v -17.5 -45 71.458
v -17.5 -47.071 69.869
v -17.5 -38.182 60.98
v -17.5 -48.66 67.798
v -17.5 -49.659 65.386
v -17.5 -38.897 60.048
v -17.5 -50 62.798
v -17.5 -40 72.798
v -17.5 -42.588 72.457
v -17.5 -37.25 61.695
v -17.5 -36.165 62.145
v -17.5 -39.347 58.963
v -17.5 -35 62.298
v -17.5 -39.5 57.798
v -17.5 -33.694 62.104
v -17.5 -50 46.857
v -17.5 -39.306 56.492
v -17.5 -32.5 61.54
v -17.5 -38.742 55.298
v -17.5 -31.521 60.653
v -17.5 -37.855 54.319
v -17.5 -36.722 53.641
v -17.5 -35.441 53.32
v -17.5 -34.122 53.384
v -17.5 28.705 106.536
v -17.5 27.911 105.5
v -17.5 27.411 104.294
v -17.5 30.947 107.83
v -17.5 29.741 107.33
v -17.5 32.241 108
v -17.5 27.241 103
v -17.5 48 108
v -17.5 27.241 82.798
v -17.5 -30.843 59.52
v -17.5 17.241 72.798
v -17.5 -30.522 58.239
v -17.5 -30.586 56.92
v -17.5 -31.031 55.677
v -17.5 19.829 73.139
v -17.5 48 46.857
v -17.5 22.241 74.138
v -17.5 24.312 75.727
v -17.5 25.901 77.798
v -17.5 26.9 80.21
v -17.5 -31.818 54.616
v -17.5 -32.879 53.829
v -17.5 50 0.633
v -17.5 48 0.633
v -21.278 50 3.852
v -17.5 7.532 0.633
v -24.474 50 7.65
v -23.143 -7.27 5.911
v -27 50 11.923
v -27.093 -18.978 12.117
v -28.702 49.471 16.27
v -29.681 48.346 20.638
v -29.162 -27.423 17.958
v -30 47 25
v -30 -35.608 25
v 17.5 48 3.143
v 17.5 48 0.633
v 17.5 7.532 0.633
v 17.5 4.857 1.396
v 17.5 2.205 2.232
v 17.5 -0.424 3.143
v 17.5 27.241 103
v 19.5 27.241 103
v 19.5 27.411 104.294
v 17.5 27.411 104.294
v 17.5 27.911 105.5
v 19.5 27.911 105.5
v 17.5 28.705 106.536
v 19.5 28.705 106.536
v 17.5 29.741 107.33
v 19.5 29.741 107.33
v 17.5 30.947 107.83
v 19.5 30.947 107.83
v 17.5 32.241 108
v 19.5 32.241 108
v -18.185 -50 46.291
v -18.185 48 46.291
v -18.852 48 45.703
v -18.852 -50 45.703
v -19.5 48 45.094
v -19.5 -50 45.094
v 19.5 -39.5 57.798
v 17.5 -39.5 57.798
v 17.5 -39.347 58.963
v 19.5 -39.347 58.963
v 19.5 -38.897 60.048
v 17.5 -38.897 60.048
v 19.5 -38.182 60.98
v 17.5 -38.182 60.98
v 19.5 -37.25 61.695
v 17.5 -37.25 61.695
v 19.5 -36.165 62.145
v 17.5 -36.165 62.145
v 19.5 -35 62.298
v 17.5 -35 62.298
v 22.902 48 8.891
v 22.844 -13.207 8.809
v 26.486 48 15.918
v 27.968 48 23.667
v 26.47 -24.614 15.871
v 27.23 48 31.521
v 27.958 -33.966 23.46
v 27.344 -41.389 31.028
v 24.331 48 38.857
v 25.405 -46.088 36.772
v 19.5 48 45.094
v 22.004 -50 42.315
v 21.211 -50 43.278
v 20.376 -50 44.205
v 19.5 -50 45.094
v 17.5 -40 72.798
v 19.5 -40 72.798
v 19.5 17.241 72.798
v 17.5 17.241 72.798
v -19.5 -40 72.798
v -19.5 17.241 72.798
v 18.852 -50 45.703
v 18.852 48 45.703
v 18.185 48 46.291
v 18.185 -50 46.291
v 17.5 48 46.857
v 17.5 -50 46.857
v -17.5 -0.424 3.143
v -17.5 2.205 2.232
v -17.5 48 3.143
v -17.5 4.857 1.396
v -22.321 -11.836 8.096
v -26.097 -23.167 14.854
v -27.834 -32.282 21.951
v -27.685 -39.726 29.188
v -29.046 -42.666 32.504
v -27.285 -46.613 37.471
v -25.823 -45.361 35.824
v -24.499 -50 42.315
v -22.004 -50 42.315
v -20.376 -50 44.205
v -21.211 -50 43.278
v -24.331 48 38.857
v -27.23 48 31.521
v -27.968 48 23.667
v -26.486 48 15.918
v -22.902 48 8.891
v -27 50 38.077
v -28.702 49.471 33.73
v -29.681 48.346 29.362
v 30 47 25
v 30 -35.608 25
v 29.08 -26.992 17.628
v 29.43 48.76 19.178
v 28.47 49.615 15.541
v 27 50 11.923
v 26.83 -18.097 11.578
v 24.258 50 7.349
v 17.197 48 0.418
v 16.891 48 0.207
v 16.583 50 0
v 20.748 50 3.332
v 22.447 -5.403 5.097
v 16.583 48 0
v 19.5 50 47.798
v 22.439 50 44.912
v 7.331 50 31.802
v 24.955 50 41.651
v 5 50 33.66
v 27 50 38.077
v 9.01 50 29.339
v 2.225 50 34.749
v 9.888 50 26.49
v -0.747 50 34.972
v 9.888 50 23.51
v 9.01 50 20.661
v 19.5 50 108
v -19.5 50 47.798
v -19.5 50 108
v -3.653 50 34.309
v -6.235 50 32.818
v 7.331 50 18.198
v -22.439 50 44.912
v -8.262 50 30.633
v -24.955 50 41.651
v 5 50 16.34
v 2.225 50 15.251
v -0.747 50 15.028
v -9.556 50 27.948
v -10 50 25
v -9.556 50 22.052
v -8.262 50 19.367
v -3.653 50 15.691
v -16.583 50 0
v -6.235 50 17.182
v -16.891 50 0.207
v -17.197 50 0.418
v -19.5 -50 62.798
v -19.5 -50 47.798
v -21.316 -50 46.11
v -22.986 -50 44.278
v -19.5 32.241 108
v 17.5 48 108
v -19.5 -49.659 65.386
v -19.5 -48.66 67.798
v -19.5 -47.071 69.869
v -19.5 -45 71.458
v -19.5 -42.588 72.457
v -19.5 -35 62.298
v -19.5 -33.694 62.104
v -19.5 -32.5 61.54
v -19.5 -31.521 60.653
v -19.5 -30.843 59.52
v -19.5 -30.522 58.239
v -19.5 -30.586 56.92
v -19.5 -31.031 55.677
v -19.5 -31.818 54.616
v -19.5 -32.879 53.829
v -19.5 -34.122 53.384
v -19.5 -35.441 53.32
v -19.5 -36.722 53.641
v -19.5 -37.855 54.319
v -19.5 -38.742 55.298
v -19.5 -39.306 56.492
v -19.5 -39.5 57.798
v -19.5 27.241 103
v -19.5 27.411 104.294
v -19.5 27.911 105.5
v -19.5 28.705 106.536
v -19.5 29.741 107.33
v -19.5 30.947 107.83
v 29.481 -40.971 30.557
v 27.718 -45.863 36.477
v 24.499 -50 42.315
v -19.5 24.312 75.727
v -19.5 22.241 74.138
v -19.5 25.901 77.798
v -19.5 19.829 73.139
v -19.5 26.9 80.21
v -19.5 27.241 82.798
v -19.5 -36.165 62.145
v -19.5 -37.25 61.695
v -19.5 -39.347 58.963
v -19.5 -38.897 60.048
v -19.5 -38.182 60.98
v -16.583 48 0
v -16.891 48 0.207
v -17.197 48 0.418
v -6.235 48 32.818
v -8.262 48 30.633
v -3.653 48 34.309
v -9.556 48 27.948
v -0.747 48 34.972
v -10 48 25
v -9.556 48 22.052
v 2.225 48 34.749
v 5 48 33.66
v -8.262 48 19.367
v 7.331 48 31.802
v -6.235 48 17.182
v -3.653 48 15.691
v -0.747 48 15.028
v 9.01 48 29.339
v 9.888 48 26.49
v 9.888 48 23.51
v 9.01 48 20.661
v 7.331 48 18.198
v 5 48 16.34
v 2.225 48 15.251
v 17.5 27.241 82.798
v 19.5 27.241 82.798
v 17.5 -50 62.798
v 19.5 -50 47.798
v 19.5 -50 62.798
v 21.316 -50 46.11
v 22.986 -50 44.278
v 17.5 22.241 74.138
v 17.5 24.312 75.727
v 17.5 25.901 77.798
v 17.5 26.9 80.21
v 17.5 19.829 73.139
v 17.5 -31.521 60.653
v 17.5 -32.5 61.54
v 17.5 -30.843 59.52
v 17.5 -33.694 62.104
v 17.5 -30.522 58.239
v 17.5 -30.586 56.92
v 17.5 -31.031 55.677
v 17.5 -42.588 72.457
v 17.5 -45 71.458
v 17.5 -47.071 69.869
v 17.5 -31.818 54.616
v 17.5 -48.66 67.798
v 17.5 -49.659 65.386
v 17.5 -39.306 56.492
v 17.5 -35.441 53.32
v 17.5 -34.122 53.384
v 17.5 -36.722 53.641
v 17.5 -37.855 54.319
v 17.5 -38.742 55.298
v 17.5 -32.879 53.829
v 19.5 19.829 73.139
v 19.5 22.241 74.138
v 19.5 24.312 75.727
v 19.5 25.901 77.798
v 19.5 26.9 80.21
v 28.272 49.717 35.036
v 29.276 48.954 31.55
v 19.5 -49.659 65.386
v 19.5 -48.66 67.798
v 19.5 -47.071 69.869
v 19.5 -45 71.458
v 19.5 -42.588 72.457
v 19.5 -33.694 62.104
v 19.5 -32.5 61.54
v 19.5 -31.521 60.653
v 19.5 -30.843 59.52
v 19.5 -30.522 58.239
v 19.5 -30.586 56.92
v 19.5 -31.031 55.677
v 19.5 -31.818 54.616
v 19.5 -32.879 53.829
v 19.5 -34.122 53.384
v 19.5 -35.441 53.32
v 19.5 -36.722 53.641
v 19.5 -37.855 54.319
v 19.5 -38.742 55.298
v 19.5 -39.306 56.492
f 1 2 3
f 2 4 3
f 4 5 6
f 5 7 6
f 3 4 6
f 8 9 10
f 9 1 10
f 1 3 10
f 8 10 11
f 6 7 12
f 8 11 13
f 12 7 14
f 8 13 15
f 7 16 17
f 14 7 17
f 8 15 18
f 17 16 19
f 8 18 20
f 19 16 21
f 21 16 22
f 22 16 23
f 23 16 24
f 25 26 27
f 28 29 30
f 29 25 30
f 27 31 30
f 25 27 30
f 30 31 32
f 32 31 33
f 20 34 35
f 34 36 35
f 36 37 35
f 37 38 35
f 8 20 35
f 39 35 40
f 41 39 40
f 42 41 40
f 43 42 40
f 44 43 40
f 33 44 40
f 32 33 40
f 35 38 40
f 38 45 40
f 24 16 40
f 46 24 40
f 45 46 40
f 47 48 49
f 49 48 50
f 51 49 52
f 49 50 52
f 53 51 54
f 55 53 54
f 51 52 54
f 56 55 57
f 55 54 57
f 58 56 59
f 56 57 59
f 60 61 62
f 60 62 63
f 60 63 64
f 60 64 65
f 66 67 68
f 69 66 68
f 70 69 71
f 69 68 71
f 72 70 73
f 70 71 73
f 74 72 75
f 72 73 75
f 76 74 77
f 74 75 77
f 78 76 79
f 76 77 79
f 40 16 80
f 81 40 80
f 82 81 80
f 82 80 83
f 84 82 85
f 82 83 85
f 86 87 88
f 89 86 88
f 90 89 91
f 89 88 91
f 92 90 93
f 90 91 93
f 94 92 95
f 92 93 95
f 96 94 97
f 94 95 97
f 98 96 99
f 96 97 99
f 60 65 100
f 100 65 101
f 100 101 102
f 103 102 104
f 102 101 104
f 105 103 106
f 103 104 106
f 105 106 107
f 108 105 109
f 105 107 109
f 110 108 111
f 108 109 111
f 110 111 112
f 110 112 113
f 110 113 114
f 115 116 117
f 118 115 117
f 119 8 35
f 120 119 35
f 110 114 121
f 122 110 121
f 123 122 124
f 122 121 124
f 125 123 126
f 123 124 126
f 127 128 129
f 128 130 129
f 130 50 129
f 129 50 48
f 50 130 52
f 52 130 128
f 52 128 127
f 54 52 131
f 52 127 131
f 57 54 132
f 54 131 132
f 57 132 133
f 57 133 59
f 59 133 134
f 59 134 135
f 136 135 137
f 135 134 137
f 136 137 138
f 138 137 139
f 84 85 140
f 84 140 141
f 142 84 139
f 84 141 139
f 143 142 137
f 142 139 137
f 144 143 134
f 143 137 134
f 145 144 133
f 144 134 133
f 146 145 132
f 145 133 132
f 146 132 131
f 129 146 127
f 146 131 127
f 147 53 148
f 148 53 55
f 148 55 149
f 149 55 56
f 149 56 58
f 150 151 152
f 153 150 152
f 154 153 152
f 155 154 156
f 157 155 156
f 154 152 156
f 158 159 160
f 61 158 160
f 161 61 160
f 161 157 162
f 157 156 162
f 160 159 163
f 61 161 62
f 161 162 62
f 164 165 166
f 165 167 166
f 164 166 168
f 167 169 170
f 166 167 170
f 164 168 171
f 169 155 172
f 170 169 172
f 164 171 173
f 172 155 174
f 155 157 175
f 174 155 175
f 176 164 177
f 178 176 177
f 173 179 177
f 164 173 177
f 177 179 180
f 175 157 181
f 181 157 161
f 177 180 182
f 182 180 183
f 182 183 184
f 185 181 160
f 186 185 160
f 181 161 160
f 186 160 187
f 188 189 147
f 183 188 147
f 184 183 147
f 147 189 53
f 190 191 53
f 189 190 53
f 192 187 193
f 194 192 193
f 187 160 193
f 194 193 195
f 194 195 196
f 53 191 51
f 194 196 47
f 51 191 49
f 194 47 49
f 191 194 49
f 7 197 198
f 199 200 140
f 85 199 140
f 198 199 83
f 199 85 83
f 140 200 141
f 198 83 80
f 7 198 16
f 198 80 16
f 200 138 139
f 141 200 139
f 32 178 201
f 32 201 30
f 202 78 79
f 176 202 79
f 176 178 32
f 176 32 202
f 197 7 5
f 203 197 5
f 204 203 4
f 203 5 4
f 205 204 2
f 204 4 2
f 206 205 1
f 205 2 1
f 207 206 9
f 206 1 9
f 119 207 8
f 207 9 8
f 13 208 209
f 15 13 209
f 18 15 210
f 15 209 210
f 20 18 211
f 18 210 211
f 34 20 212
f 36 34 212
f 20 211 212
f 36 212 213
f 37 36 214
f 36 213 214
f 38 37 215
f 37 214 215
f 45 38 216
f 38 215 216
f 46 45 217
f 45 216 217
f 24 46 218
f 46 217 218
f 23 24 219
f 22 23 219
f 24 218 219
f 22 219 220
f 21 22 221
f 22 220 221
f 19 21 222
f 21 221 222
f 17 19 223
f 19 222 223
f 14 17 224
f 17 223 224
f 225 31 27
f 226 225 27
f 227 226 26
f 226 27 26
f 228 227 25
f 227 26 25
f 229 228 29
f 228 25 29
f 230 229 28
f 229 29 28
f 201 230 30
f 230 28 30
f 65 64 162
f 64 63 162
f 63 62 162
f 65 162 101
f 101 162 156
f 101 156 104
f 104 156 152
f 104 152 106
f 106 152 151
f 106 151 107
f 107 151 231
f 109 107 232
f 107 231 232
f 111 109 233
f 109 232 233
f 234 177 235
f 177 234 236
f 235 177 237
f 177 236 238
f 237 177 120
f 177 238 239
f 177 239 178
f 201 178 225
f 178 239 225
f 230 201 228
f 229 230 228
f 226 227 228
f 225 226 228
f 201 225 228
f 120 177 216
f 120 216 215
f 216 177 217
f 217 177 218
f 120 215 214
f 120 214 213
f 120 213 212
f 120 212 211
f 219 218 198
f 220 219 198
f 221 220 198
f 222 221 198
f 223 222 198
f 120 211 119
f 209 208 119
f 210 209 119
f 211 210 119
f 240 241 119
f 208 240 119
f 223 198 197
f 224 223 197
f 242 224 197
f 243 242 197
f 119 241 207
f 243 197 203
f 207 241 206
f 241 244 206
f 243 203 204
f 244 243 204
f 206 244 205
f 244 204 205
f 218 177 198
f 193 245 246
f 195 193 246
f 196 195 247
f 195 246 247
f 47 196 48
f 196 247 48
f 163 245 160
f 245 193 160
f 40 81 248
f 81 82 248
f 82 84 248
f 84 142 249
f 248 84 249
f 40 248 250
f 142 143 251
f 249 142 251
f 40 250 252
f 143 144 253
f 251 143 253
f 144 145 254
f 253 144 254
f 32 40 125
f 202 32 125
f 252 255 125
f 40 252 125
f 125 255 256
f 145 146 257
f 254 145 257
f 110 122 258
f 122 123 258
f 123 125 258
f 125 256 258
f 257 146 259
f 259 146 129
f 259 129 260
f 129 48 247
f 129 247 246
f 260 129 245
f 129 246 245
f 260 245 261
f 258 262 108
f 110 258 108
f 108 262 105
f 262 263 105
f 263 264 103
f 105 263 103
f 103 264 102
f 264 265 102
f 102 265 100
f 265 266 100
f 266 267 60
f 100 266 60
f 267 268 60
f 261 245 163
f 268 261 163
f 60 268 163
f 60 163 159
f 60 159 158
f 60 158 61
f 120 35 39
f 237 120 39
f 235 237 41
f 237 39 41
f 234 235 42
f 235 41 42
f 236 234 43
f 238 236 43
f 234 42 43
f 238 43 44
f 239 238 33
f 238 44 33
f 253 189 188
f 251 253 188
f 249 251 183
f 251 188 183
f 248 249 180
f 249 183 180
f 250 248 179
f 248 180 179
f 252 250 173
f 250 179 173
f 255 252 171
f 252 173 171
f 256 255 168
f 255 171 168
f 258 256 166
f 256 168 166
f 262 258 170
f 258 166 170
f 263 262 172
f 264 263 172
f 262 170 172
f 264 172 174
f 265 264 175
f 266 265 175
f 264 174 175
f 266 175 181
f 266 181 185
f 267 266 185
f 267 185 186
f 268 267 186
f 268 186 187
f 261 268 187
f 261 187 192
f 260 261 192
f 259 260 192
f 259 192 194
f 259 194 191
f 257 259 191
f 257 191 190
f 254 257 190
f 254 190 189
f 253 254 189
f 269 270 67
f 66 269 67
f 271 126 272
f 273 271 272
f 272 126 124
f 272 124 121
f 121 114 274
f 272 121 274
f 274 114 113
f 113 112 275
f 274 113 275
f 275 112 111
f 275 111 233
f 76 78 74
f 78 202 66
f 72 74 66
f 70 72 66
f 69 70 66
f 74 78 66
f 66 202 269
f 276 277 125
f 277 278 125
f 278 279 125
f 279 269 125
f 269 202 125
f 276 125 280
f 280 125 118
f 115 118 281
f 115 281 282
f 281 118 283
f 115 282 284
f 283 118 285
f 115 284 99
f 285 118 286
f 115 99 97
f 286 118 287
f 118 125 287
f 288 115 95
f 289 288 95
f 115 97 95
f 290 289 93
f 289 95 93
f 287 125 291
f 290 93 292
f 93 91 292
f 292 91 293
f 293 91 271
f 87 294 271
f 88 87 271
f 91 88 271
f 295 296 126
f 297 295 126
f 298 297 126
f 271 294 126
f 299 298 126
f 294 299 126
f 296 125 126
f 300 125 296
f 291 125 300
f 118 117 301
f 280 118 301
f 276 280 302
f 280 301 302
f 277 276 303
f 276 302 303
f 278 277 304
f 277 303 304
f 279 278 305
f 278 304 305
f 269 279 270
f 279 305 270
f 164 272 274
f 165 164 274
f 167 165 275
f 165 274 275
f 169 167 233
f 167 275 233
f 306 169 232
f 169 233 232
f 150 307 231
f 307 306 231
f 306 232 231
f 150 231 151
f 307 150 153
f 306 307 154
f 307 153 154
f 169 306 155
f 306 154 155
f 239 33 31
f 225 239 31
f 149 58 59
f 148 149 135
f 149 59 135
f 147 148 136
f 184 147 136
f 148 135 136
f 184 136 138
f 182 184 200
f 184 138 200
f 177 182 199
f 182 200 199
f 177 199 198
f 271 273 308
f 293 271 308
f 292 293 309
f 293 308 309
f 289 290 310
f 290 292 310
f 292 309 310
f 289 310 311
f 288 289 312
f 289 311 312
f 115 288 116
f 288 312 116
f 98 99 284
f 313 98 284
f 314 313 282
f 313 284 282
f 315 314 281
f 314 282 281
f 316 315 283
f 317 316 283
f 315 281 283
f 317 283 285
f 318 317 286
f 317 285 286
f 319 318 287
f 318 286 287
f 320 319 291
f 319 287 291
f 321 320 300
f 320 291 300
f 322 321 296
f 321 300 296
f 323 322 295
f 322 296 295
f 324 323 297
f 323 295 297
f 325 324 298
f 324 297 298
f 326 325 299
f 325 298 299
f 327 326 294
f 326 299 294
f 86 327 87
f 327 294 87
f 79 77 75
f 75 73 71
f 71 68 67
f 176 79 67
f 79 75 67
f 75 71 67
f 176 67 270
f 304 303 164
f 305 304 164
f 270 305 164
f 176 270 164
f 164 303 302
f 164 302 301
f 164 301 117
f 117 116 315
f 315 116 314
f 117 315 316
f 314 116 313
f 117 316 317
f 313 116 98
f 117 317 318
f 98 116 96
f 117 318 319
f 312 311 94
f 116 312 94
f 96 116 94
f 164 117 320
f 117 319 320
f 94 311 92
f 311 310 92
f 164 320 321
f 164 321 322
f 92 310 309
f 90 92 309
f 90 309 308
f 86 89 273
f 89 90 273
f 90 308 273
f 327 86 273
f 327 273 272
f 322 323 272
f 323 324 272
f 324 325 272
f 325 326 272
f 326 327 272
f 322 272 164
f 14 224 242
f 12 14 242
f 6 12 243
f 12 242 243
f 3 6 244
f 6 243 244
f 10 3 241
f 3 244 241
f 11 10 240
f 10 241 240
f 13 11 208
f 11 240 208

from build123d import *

# Parameters (mm, degrees)
F1_DEPTH  = 108
F3_DEPTH  = 150
F5_DEPTH  = 98
F7_DEPTH  = 100
F8_DEPTH  = 100
F10_DEPTH = 100
F11_R     = 10
F12_DEPTH = 25
F14_DEPTH = 100


with BuildPart() as f1:
    # F0 (on Top) → F1 (new body)
    with BuildSketch(Plane.XY):
        with BuildLine():
            Line((17.5, -50), (30, -50))
            Line((30, -50), (30, 47))
            ThreePointArc((30, 47), (29.1213203436, 49.1213203436), (27, 50))
            Line((27, 50), (-27, 50))
            ThreePointArc((-27, 50), (-29.1213203436, 49.1213203436), (-30, 47))
            Line((-30, 47), (-30, -50))
            Line((-30, -50), (-17.5, -50))
            Line((-17.5, -50), (-17.5, -48))
            Line((-17.5, -48), (-17.5, 48))
            Line((-17.5, 48), (17.5, 48))
            Line((17.5, 48), (17.5, -48))
            Line((17.5, -48), (17.5, -50))
        make_face()
    extrude(amount=F1_DEPTH)

    # F2 (on face) → F3 (cut)
    with BuildSketch(Plane.XZ.offset(50)):
        with BuildLine():
            Line((30, 0), (30, 25))
            ThreePointArc((30, 25), (26.4338203685, 10.8136283454), (16.5831239518, 0))
            Line((16.5831239518, 0), (30, 0))
        make_face()
        with BuildLine():
            ThreePointArc((-17.5, 0.633014138), (-26.6926956301, 11.3069360624), (-30, 25))
            Line((-30, 25), (-30, 0))
            Line((-30, 0), (-17.5, 0))
            Line((-17.5, 0), (-17.5, 0.633014138))
        make_face()
        with BuildLine():
            ThreePointArc((-16.5831239518, 0), (-17.0445009109, 0.3122502302), (-17.5, 0.633014138))
            Line((-17.5, 0.633014138), (-17.5, 0))
            Line((-17.5, 0), (-16.5831239518, 0))
        make_face()
    extrude(amount=-F3_DEPTH, mode=Mode.SUBTRACT)

    # F4 (on face) → F5 (cut)
    with BuildSketch(Plane.XZ.offset(50)):
        with BuildLine():
            ThreePointArc((-19.5, 45.0935312974), (-27.9682339411, 23.6666245026), (-17.5, 3.1425070056))
            Line((-17.5, 3.1425070056), (-17.5, 46.8574929944))
            ThreePointArc((-17.5, 46.8574929944), (-18.5210121272, 45.9993359367), (-19.5, 45.0935312974))
        make_face()
        with BuildLine():
            Line((17.5, 46.8574929944), (17.5, 3.1425070056))
            ThreePointArc((17.5, 3.1425070056), (25.2388589282, 12.875644347), (28, 25))
            ThreePointArc((28, 25), (25.7875939165, 35.9087121146), (19.5, 45.0935312974))
            ThreePointArc((19.5, 45.0935312974), (18.5210121272, 45.9993359367), (17.5, 46.8574929944))
        make_face()
    extrude(amount=-F5_DEPTH, mode=Mode.SUBTRACT)

    # F6 (on face) → F7 (cut)
    with BuildSketch(Plane.YZ.offset(30)):
        with BuildLine():
            Line((-50, 42.3148013651), (-50, 0))
            Line((-50, 0), (10, 0))
            ThreePointArc((10, 0), (-24.0239311691, 15.4516934038), (-50, 42.3148013651))
        make_face()
    extrude(amount=-F7_DEPTH, mode=Mode.SUBTRACT)

    # F4 (on face) → F8 (cut)
    with BuildSketch(Plane.XZ.offset(50)):
        with BuildLine():
            Line((-30, 108), (-30, 25))
            ThreePointArc((-30, 25), (-27.2488531869, 37.549900398), (-19.5, 47.7980262304))
            Line((-19.5, 47.7980262304), (-19.5, 108))
            Line((-19.5, 108), (-30, 108))
        make_face()
        with BuildLine():
            ThreePointArc((19.5, 47.7980262304), (27.2488531869, 37.549900398), (30, 25))
            Line((30, 25), (30, 108))
            Line((30, 108), (19.5, 108))
            Line((19.5, 108), (19.5, 47.7980262304))
        make_face()
    extrude(amount=-F8_DEPTH, mode=Mode.SUBTRACT)

    # F9 (on face) → F10 (cut)
    with BuildSketch(Plane.YZ.offset(19.5)):
        with BuildLine():
            ThreePointArc((-50, 62.7980262304), (-47.0710678119, 69.8690940422), (-40, 72.7980262304))
            Line((-40, 72.7980262304), (17.2408529371, 72.7980262304))
            ThreePointArc((17.2408529371, 72.7980262304), (24.311920749, 75.7269584185), (27.2408529371, 82.7980262304))
            Line((27.2408529371, 82.7980262304), (27.2408529371, 103))
            ThreePointArc((27.2408529371, 103), (28.7053190312, 106.5355339059), (32.2408529371, 108))
            Line((32.2408529371, 108), (-50, 108))
            Line((-50, 108), (-50, 62.7980262304))
        make_face()
    extrude(amount=-F10_DEPTH, mode=Mode.SUBTRACT)

    # F11 (on face) → F12 (cut)
    with BuildSketch(Plane(origin=(0, 50, 0), x_dir=(-1, 0, 0), z_dir=(0, 1, 0))):
        with Locations((0, 25)):
            Circle(F11_R)
    extrude(amount=-F12_DEPTH, mode=Mode.SUBTRACT)

    # F13 (on face) → F14 (cut)
    with BuildSketch(Plane(origin=(-19.5, 0, 0), x_dir=(0, -1, 0), z_dir=(-1, 0, 0))):
        with BuildLine():
            Line((35, 57.7980262304), (39.5, 57.7980262304))
            ThreePointArc((39.5, 57.7980262304), (38.1819805153, 60.9800067457), (35, 62.2980262304))
            Line((35, 62.2980262304), (35, 57.7980262304))
        make_face()
        with BuildLine():
            ThreePointArc((35, 62.2980262304), (31.8180194847, 54.616045715), (39.5, 57.7980262304))
            Line((39.5, 57.7980262304), (35, 57.7980262304))
            Line((35, 57.7980262304), (35, 62.2980262304))
        make_face()
    extrude(amount=-F14_DEPTH, mode=Mode.SUBTRACT)


solid = f1.part
